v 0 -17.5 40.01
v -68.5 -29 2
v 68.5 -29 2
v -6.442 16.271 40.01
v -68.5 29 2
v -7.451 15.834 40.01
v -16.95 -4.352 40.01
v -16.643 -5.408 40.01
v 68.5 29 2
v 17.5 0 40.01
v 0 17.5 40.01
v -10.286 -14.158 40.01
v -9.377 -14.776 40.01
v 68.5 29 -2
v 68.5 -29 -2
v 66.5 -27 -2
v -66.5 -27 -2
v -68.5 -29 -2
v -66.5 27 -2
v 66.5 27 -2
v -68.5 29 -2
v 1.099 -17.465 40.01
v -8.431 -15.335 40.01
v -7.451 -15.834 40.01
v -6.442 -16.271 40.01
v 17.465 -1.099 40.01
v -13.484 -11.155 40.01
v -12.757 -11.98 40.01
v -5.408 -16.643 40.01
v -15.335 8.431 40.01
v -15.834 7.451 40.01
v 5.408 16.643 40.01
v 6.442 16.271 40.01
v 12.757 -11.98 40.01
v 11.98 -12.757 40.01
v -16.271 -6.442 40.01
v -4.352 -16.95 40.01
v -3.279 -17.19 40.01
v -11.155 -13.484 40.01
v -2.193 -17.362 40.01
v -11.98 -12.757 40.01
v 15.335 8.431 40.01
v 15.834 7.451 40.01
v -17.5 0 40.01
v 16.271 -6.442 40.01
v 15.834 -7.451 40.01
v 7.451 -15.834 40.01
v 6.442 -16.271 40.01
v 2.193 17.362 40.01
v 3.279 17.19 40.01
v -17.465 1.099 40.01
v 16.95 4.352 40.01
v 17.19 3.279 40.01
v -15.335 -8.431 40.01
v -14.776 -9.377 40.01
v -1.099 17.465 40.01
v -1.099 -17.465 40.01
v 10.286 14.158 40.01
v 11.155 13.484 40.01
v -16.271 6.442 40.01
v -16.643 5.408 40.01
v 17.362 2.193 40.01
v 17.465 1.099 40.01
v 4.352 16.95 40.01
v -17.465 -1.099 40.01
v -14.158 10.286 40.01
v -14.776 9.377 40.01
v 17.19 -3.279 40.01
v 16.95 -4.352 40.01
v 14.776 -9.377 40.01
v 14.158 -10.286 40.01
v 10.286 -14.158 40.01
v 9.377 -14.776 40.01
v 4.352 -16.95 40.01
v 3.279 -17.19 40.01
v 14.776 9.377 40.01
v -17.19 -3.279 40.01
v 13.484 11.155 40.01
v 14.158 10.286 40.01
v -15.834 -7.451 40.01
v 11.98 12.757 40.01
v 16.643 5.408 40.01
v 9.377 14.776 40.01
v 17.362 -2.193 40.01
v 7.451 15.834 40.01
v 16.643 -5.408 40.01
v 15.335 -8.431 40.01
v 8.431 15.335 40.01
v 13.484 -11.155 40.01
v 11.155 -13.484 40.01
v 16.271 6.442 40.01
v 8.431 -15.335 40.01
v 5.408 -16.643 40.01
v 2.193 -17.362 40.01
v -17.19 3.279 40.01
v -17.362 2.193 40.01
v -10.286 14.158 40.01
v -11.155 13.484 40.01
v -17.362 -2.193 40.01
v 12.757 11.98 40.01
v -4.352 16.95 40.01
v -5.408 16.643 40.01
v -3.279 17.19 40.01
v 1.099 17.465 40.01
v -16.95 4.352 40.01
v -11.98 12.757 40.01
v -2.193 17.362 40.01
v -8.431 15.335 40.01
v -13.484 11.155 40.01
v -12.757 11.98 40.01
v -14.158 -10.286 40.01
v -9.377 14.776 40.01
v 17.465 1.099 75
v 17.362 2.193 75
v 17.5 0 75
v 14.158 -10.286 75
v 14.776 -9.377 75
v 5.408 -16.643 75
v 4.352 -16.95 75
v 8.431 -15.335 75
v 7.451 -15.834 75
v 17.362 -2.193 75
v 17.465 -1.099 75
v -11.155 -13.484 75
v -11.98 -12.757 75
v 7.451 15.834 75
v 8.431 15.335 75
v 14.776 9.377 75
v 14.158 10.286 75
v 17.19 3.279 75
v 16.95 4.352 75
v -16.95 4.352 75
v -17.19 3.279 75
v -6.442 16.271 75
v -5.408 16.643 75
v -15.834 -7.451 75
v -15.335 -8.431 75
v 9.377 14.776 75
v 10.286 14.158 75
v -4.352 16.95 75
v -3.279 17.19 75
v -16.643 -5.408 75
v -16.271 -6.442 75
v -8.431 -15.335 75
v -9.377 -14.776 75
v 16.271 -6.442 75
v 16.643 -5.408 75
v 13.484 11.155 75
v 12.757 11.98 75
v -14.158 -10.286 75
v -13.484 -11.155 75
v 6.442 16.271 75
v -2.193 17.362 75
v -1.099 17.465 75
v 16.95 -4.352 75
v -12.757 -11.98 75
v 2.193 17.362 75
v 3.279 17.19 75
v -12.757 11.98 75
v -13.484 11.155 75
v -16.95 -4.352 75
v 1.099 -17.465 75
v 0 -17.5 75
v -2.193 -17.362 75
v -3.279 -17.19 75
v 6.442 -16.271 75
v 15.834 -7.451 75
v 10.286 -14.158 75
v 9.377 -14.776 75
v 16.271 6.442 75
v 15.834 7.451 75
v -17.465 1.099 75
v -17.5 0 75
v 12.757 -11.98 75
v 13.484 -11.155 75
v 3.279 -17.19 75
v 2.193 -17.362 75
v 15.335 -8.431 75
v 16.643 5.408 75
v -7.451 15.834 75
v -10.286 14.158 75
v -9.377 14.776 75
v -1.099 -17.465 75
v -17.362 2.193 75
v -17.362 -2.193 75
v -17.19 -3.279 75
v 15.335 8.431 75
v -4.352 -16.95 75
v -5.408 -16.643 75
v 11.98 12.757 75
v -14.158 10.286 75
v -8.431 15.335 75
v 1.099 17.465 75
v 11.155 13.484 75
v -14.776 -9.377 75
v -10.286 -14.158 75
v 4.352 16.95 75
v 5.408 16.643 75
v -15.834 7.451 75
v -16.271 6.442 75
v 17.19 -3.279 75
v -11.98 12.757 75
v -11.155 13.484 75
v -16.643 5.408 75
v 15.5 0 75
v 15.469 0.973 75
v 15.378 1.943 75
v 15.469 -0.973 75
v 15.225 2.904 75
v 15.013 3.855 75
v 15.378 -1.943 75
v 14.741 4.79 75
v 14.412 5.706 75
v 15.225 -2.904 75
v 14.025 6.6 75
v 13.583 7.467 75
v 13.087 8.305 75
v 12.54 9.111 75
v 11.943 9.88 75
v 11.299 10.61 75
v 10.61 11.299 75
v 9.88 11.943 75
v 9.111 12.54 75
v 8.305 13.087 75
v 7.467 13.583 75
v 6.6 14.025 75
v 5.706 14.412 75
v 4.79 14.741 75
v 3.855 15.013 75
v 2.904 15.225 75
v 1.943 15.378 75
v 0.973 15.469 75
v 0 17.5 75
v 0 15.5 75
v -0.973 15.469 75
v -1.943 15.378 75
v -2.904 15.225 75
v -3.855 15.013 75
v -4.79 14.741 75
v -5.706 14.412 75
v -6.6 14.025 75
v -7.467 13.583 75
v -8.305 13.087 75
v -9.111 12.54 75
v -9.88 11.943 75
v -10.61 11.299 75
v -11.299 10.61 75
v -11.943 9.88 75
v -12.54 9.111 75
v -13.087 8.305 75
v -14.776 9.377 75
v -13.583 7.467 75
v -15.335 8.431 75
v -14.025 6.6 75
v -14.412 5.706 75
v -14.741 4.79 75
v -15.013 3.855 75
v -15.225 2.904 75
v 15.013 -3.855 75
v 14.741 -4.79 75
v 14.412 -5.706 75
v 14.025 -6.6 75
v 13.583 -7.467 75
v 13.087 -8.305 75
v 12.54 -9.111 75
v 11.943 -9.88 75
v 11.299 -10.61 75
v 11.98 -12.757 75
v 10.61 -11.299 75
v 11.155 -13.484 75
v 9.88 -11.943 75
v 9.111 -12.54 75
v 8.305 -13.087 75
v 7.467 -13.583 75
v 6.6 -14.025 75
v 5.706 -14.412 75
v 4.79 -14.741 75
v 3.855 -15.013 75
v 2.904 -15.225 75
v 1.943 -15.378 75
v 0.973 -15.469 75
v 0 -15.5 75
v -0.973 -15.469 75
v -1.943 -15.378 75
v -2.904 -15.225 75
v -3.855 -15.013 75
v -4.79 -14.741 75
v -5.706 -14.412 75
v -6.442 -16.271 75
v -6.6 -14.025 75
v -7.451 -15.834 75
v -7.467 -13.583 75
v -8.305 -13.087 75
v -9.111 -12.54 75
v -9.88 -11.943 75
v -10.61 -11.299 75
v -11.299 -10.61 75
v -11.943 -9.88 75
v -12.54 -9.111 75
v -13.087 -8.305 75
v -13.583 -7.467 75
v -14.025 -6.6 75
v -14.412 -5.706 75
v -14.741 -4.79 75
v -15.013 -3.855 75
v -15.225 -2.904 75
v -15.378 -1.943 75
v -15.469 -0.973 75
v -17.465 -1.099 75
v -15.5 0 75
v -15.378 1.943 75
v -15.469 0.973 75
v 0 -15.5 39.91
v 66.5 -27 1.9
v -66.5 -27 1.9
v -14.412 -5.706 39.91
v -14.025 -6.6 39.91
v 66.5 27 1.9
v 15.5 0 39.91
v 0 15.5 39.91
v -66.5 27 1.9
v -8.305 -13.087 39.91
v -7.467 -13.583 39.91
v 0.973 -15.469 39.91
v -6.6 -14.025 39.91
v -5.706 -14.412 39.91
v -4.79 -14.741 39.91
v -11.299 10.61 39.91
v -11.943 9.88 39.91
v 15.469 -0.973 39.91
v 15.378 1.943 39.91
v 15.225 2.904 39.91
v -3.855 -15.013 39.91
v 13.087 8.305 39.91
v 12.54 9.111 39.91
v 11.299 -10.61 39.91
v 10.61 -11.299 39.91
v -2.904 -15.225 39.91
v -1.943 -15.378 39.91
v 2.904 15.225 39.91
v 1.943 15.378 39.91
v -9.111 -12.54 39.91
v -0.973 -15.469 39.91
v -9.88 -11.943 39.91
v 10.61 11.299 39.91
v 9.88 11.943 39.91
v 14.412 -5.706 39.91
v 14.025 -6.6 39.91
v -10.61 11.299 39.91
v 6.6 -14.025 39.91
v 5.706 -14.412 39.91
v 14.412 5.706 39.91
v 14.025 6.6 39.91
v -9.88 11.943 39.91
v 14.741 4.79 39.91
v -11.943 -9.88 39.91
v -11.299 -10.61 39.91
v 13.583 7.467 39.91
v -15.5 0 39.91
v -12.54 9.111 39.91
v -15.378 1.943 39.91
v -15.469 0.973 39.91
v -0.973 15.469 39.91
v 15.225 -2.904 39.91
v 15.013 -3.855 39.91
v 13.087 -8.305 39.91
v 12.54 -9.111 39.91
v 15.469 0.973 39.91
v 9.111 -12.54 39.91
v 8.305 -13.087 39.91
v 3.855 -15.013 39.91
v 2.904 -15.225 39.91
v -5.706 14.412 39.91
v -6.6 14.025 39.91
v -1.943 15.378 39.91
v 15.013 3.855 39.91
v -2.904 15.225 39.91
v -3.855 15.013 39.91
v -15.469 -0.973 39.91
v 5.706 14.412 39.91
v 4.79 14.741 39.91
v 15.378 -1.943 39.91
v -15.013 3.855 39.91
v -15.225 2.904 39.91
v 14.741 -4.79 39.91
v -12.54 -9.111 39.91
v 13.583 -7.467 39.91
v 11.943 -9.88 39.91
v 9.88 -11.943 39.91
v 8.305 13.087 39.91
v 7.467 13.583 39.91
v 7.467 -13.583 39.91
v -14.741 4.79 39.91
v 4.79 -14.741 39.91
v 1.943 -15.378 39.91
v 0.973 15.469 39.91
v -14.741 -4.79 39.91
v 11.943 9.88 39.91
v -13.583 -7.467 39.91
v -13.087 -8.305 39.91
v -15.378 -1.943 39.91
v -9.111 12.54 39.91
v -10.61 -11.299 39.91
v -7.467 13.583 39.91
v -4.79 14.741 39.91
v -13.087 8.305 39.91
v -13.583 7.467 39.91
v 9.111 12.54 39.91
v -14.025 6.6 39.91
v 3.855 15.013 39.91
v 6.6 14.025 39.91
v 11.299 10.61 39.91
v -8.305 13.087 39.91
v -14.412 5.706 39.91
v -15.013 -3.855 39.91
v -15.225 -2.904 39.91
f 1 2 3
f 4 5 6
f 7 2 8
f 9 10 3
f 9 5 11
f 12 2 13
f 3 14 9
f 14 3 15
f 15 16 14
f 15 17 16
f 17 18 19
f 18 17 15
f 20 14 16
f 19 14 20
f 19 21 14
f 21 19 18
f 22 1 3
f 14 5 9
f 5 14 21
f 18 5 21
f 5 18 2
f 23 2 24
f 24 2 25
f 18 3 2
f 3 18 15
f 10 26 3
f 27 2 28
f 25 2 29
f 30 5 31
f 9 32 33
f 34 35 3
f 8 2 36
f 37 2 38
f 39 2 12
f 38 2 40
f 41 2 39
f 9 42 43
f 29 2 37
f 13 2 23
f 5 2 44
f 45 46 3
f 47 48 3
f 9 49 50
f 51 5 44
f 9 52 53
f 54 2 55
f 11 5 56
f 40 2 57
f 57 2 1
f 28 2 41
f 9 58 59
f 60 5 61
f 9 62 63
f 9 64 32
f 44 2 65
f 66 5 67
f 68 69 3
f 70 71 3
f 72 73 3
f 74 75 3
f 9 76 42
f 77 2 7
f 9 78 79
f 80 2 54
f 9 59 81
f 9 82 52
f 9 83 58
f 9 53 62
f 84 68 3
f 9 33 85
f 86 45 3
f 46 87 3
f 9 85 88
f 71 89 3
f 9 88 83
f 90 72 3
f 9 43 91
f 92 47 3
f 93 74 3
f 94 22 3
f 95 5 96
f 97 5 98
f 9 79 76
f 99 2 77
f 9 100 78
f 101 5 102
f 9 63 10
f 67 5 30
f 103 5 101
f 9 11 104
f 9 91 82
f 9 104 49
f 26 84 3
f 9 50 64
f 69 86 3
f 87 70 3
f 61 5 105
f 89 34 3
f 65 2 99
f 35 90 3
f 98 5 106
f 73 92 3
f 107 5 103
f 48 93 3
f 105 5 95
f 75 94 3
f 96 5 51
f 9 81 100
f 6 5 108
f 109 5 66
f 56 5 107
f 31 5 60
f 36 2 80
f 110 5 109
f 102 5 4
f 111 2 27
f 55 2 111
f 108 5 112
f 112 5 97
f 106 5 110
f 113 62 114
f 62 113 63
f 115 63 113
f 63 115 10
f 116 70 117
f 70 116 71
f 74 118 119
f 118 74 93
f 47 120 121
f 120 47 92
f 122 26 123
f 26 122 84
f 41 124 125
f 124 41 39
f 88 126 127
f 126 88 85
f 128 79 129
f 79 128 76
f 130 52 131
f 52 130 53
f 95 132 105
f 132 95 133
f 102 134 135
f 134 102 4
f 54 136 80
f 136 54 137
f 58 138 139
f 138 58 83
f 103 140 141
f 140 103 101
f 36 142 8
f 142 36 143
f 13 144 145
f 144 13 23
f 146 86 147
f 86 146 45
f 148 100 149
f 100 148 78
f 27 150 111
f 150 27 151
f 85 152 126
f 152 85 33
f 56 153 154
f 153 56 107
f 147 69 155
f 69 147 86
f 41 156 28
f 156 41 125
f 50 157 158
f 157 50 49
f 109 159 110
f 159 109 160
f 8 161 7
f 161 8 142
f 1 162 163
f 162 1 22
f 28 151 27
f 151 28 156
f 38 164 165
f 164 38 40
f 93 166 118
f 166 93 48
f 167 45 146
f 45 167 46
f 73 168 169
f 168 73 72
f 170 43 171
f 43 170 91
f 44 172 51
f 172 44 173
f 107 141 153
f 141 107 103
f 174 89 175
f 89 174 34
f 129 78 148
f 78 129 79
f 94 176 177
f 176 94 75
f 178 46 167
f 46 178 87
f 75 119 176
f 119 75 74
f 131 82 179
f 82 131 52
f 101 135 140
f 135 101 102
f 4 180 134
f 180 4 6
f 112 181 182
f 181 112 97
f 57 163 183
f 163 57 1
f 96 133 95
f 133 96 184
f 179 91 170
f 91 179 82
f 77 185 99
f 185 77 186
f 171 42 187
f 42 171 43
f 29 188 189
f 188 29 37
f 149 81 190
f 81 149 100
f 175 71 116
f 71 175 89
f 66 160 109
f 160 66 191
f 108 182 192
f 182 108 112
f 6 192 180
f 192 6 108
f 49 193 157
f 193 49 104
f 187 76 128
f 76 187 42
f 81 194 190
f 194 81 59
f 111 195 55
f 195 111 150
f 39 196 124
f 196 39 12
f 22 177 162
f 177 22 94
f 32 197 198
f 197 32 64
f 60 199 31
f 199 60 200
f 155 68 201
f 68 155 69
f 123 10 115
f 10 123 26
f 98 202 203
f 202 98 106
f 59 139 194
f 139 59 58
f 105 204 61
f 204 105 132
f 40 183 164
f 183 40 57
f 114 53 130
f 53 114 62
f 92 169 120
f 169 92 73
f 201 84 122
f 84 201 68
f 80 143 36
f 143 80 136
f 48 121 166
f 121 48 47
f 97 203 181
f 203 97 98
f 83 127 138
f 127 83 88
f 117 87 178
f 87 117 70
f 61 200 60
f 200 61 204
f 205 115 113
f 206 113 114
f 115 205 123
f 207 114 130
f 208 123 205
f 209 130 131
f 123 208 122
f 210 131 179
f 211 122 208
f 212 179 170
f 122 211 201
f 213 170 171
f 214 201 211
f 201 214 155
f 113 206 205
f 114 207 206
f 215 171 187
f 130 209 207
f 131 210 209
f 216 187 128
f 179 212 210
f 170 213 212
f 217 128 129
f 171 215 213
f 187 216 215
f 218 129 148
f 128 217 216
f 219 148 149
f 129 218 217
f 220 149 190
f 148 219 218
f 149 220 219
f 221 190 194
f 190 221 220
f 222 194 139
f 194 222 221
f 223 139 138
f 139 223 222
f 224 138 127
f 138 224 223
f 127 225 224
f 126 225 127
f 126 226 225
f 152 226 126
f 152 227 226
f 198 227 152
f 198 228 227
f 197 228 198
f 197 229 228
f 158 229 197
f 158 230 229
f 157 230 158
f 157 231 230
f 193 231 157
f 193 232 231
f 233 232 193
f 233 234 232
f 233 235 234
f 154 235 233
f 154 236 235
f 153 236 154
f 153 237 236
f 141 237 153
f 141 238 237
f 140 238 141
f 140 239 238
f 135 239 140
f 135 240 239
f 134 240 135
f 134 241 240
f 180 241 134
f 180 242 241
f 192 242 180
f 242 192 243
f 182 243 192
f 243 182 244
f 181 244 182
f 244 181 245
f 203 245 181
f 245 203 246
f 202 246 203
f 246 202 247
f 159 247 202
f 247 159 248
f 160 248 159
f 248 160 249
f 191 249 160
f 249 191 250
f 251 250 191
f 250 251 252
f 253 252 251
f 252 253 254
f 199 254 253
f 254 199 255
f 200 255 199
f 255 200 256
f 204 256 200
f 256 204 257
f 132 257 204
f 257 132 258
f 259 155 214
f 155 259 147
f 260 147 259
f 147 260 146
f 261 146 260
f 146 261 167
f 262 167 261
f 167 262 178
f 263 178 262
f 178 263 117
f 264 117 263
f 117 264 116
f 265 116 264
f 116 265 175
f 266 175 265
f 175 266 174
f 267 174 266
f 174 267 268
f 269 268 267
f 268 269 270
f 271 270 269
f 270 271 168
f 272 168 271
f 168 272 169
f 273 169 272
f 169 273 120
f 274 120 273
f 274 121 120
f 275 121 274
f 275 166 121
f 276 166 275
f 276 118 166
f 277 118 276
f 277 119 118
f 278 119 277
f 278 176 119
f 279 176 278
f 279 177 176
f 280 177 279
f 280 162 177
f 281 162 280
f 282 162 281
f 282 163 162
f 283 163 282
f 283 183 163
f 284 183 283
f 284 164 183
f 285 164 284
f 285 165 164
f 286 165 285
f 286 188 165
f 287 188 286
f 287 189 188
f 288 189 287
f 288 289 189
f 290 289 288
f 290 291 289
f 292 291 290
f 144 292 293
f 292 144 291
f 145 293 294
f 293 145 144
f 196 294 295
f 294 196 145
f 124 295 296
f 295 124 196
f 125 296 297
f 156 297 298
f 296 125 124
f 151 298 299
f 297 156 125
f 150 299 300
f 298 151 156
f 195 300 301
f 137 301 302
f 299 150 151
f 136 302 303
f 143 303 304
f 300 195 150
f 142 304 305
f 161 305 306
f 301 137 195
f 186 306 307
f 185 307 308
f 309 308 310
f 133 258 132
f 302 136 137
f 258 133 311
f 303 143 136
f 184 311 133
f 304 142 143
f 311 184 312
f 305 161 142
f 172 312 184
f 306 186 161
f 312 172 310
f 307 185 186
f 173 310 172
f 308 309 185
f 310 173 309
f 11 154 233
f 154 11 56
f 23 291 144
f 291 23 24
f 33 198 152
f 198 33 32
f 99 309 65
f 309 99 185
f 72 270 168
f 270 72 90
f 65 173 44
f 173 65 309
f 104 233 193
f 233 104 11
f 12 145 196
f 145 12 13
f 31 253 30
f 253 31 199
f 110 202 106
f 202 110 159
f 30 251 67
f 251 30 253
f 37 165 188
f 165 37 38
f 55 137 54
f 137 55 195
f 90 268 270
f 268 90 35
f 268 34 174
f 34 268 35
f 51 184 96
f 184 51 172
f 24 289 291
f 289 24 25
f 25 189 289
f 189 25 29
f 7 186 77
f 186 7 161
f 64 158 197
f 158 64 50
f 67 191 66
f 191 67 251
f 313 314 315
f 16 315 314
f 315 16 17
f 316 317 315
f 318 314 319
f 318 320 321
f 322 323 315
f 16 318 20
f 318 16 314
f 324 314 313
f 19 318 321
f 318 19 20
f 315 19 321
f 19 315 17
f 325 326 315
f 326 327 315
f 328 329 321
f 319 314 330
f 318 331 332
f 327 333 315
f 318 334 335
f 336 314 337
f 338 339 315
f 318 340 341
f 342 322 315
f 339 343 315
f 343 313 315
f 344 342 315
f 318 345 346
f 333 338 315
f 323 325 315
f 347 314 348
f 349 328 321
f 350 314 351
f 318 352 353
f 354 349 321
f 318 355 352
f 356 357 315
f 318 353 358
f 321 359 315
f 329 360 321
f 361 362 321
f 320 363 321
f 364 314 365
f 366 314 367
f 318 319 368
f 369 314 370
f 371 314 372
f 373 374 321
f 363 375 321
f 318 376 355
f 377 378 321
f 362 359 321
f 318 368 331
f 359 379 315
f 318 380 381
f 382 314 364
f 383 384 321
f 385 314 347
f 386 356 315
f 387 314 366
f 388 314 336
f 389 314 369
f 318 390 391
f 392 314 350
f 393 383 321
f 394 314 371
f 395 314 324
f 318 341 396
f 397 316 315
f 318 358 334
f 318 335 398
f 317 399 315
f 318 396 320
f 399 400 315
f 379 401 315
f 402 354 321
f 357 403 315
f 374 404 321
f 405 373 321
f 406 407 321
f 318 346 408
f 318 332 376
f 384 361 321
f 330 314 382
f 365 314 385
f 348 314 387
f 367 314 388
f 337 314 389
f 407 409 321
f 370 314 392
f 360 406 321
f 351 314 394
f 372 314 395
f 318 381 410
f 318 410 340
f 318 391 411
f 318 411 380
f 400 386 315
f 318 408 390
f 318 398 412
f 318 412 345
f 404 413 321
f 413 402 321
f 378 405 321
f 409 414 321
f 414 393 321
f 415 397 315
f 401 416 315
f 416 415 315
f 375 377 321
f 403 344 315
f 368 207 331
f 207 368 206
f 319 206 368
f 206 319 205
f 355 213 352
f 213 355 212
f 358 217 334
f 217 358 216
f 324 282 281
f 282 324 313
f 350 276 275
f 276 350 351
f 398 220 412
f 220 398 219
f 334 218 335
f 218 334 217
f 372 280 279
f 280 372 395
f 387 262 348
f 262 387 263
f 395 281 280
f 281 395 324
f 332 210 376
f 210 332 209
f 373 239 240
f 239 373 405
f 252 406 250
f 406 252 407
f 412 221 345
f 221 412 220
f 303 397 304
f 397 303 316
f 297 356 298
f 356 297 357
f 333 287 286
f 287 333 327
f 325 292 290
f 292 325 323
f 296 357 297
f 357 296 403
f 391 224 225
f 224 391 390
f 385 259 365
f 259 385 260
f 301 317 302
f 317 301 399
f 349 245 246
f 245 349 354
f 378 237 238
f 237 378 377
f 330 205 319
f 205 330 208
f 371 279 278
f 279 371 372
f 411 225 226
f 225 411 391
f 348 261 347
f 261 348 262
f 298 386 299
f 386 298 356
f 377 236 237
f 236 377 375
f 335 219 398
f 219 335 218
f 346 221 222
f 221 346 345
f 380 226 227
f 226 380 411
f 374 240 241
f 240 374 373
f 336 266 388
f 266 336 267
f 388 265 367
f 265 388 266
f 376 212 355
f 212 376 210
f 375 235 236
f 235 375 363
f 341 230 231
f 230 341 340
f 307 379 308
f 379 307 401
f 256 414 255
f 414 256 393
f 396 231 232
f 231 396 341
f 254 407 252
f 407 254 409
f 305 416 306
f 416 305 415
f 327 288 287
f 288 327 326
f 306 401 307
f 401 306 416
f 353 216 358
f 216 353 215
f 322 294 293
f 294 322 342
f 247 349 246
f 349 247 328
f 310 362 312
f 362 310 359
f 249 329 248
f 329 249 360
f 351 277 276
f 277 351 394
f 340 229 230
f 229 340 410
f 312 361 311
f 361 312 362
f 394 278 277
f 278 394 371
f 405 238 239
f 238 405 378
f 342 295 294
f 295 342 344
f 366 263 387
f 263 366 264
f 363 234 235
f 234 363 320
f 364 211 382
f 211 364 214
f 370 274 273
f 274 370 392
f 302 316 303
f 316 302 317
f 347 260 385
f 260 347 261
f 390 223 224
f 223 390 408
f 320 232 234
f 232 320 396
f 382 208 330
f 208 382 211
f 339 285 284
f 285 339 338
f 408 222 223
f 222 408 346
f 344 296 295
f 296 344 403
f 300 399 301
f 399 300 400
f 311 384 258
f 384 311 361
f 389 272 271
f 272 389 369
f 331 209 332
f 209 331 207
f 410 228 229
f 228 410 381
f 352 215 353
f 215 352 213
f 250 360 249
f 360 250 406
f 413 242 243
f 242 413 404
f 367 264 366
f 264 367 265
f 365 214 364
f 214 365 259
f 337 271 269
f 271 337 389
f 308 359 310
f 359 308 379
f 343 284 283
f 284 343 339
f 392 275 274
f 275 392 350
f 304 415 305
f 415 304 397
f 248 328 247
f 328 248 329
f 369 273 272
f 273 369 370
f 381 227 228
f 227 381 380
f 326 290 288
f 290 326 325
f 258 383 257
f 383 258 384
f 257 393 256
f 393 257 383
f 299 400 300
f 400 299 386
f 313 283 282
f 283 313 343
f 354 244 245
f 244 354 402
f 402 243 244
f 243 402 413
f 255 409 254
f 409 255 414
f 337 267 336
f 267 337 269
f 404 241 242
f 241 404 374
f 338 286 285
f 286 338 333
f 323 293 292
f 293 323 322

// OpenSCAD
// --- Dimensions (Adjust as needed) ---
rect_width = 137;
rect_depth = 58;
loft_height = 40;
neck_height = 35;
neck_radius = 17.5;
wall_thick = 2;
bottom_cube_height = 4;
$fn = 100; // Smooth circles

module outer_shape() {
    // The transition part
    hull() {
        // Bottom rectangle (as a very thin cube)
        cube([rect_width, rect_depth, bottom_cube_height], center=true);
        // Top circle (as a very thin cylinder)
        translate([0, 0, loft_height])
            cylinder(h=0.01, r=neck_radius);
    }
    // The neck part
    translate([0, 0, loft_height])
        cylinder(h=neck_height, r=neck_radius);
}

module inner_shape() {
    // Reduce dimensions for the hollow inside
    hull() {
        cube([rect_width - 2*wall_thick, rect_depth - 2*wall_thick, bottom_cube_height], center=true);
        translate([0, 0, loft_height])
            cylinder(h=0.01, r=neck_radius - wall_thick);
    }
    translate([0, 0, loft_height])
        // Make it slightly taller to ensure a clean cut through the top
        cylinder(h=neck_height + 1, r=neck_radius - wall_thick);
}

// Final subtraction
difference() {
    outer_shape();
    // Lower the inner shape slightly to cut through the bottom
    translate([0, 0, -0.1])
        inner_shape();
}
